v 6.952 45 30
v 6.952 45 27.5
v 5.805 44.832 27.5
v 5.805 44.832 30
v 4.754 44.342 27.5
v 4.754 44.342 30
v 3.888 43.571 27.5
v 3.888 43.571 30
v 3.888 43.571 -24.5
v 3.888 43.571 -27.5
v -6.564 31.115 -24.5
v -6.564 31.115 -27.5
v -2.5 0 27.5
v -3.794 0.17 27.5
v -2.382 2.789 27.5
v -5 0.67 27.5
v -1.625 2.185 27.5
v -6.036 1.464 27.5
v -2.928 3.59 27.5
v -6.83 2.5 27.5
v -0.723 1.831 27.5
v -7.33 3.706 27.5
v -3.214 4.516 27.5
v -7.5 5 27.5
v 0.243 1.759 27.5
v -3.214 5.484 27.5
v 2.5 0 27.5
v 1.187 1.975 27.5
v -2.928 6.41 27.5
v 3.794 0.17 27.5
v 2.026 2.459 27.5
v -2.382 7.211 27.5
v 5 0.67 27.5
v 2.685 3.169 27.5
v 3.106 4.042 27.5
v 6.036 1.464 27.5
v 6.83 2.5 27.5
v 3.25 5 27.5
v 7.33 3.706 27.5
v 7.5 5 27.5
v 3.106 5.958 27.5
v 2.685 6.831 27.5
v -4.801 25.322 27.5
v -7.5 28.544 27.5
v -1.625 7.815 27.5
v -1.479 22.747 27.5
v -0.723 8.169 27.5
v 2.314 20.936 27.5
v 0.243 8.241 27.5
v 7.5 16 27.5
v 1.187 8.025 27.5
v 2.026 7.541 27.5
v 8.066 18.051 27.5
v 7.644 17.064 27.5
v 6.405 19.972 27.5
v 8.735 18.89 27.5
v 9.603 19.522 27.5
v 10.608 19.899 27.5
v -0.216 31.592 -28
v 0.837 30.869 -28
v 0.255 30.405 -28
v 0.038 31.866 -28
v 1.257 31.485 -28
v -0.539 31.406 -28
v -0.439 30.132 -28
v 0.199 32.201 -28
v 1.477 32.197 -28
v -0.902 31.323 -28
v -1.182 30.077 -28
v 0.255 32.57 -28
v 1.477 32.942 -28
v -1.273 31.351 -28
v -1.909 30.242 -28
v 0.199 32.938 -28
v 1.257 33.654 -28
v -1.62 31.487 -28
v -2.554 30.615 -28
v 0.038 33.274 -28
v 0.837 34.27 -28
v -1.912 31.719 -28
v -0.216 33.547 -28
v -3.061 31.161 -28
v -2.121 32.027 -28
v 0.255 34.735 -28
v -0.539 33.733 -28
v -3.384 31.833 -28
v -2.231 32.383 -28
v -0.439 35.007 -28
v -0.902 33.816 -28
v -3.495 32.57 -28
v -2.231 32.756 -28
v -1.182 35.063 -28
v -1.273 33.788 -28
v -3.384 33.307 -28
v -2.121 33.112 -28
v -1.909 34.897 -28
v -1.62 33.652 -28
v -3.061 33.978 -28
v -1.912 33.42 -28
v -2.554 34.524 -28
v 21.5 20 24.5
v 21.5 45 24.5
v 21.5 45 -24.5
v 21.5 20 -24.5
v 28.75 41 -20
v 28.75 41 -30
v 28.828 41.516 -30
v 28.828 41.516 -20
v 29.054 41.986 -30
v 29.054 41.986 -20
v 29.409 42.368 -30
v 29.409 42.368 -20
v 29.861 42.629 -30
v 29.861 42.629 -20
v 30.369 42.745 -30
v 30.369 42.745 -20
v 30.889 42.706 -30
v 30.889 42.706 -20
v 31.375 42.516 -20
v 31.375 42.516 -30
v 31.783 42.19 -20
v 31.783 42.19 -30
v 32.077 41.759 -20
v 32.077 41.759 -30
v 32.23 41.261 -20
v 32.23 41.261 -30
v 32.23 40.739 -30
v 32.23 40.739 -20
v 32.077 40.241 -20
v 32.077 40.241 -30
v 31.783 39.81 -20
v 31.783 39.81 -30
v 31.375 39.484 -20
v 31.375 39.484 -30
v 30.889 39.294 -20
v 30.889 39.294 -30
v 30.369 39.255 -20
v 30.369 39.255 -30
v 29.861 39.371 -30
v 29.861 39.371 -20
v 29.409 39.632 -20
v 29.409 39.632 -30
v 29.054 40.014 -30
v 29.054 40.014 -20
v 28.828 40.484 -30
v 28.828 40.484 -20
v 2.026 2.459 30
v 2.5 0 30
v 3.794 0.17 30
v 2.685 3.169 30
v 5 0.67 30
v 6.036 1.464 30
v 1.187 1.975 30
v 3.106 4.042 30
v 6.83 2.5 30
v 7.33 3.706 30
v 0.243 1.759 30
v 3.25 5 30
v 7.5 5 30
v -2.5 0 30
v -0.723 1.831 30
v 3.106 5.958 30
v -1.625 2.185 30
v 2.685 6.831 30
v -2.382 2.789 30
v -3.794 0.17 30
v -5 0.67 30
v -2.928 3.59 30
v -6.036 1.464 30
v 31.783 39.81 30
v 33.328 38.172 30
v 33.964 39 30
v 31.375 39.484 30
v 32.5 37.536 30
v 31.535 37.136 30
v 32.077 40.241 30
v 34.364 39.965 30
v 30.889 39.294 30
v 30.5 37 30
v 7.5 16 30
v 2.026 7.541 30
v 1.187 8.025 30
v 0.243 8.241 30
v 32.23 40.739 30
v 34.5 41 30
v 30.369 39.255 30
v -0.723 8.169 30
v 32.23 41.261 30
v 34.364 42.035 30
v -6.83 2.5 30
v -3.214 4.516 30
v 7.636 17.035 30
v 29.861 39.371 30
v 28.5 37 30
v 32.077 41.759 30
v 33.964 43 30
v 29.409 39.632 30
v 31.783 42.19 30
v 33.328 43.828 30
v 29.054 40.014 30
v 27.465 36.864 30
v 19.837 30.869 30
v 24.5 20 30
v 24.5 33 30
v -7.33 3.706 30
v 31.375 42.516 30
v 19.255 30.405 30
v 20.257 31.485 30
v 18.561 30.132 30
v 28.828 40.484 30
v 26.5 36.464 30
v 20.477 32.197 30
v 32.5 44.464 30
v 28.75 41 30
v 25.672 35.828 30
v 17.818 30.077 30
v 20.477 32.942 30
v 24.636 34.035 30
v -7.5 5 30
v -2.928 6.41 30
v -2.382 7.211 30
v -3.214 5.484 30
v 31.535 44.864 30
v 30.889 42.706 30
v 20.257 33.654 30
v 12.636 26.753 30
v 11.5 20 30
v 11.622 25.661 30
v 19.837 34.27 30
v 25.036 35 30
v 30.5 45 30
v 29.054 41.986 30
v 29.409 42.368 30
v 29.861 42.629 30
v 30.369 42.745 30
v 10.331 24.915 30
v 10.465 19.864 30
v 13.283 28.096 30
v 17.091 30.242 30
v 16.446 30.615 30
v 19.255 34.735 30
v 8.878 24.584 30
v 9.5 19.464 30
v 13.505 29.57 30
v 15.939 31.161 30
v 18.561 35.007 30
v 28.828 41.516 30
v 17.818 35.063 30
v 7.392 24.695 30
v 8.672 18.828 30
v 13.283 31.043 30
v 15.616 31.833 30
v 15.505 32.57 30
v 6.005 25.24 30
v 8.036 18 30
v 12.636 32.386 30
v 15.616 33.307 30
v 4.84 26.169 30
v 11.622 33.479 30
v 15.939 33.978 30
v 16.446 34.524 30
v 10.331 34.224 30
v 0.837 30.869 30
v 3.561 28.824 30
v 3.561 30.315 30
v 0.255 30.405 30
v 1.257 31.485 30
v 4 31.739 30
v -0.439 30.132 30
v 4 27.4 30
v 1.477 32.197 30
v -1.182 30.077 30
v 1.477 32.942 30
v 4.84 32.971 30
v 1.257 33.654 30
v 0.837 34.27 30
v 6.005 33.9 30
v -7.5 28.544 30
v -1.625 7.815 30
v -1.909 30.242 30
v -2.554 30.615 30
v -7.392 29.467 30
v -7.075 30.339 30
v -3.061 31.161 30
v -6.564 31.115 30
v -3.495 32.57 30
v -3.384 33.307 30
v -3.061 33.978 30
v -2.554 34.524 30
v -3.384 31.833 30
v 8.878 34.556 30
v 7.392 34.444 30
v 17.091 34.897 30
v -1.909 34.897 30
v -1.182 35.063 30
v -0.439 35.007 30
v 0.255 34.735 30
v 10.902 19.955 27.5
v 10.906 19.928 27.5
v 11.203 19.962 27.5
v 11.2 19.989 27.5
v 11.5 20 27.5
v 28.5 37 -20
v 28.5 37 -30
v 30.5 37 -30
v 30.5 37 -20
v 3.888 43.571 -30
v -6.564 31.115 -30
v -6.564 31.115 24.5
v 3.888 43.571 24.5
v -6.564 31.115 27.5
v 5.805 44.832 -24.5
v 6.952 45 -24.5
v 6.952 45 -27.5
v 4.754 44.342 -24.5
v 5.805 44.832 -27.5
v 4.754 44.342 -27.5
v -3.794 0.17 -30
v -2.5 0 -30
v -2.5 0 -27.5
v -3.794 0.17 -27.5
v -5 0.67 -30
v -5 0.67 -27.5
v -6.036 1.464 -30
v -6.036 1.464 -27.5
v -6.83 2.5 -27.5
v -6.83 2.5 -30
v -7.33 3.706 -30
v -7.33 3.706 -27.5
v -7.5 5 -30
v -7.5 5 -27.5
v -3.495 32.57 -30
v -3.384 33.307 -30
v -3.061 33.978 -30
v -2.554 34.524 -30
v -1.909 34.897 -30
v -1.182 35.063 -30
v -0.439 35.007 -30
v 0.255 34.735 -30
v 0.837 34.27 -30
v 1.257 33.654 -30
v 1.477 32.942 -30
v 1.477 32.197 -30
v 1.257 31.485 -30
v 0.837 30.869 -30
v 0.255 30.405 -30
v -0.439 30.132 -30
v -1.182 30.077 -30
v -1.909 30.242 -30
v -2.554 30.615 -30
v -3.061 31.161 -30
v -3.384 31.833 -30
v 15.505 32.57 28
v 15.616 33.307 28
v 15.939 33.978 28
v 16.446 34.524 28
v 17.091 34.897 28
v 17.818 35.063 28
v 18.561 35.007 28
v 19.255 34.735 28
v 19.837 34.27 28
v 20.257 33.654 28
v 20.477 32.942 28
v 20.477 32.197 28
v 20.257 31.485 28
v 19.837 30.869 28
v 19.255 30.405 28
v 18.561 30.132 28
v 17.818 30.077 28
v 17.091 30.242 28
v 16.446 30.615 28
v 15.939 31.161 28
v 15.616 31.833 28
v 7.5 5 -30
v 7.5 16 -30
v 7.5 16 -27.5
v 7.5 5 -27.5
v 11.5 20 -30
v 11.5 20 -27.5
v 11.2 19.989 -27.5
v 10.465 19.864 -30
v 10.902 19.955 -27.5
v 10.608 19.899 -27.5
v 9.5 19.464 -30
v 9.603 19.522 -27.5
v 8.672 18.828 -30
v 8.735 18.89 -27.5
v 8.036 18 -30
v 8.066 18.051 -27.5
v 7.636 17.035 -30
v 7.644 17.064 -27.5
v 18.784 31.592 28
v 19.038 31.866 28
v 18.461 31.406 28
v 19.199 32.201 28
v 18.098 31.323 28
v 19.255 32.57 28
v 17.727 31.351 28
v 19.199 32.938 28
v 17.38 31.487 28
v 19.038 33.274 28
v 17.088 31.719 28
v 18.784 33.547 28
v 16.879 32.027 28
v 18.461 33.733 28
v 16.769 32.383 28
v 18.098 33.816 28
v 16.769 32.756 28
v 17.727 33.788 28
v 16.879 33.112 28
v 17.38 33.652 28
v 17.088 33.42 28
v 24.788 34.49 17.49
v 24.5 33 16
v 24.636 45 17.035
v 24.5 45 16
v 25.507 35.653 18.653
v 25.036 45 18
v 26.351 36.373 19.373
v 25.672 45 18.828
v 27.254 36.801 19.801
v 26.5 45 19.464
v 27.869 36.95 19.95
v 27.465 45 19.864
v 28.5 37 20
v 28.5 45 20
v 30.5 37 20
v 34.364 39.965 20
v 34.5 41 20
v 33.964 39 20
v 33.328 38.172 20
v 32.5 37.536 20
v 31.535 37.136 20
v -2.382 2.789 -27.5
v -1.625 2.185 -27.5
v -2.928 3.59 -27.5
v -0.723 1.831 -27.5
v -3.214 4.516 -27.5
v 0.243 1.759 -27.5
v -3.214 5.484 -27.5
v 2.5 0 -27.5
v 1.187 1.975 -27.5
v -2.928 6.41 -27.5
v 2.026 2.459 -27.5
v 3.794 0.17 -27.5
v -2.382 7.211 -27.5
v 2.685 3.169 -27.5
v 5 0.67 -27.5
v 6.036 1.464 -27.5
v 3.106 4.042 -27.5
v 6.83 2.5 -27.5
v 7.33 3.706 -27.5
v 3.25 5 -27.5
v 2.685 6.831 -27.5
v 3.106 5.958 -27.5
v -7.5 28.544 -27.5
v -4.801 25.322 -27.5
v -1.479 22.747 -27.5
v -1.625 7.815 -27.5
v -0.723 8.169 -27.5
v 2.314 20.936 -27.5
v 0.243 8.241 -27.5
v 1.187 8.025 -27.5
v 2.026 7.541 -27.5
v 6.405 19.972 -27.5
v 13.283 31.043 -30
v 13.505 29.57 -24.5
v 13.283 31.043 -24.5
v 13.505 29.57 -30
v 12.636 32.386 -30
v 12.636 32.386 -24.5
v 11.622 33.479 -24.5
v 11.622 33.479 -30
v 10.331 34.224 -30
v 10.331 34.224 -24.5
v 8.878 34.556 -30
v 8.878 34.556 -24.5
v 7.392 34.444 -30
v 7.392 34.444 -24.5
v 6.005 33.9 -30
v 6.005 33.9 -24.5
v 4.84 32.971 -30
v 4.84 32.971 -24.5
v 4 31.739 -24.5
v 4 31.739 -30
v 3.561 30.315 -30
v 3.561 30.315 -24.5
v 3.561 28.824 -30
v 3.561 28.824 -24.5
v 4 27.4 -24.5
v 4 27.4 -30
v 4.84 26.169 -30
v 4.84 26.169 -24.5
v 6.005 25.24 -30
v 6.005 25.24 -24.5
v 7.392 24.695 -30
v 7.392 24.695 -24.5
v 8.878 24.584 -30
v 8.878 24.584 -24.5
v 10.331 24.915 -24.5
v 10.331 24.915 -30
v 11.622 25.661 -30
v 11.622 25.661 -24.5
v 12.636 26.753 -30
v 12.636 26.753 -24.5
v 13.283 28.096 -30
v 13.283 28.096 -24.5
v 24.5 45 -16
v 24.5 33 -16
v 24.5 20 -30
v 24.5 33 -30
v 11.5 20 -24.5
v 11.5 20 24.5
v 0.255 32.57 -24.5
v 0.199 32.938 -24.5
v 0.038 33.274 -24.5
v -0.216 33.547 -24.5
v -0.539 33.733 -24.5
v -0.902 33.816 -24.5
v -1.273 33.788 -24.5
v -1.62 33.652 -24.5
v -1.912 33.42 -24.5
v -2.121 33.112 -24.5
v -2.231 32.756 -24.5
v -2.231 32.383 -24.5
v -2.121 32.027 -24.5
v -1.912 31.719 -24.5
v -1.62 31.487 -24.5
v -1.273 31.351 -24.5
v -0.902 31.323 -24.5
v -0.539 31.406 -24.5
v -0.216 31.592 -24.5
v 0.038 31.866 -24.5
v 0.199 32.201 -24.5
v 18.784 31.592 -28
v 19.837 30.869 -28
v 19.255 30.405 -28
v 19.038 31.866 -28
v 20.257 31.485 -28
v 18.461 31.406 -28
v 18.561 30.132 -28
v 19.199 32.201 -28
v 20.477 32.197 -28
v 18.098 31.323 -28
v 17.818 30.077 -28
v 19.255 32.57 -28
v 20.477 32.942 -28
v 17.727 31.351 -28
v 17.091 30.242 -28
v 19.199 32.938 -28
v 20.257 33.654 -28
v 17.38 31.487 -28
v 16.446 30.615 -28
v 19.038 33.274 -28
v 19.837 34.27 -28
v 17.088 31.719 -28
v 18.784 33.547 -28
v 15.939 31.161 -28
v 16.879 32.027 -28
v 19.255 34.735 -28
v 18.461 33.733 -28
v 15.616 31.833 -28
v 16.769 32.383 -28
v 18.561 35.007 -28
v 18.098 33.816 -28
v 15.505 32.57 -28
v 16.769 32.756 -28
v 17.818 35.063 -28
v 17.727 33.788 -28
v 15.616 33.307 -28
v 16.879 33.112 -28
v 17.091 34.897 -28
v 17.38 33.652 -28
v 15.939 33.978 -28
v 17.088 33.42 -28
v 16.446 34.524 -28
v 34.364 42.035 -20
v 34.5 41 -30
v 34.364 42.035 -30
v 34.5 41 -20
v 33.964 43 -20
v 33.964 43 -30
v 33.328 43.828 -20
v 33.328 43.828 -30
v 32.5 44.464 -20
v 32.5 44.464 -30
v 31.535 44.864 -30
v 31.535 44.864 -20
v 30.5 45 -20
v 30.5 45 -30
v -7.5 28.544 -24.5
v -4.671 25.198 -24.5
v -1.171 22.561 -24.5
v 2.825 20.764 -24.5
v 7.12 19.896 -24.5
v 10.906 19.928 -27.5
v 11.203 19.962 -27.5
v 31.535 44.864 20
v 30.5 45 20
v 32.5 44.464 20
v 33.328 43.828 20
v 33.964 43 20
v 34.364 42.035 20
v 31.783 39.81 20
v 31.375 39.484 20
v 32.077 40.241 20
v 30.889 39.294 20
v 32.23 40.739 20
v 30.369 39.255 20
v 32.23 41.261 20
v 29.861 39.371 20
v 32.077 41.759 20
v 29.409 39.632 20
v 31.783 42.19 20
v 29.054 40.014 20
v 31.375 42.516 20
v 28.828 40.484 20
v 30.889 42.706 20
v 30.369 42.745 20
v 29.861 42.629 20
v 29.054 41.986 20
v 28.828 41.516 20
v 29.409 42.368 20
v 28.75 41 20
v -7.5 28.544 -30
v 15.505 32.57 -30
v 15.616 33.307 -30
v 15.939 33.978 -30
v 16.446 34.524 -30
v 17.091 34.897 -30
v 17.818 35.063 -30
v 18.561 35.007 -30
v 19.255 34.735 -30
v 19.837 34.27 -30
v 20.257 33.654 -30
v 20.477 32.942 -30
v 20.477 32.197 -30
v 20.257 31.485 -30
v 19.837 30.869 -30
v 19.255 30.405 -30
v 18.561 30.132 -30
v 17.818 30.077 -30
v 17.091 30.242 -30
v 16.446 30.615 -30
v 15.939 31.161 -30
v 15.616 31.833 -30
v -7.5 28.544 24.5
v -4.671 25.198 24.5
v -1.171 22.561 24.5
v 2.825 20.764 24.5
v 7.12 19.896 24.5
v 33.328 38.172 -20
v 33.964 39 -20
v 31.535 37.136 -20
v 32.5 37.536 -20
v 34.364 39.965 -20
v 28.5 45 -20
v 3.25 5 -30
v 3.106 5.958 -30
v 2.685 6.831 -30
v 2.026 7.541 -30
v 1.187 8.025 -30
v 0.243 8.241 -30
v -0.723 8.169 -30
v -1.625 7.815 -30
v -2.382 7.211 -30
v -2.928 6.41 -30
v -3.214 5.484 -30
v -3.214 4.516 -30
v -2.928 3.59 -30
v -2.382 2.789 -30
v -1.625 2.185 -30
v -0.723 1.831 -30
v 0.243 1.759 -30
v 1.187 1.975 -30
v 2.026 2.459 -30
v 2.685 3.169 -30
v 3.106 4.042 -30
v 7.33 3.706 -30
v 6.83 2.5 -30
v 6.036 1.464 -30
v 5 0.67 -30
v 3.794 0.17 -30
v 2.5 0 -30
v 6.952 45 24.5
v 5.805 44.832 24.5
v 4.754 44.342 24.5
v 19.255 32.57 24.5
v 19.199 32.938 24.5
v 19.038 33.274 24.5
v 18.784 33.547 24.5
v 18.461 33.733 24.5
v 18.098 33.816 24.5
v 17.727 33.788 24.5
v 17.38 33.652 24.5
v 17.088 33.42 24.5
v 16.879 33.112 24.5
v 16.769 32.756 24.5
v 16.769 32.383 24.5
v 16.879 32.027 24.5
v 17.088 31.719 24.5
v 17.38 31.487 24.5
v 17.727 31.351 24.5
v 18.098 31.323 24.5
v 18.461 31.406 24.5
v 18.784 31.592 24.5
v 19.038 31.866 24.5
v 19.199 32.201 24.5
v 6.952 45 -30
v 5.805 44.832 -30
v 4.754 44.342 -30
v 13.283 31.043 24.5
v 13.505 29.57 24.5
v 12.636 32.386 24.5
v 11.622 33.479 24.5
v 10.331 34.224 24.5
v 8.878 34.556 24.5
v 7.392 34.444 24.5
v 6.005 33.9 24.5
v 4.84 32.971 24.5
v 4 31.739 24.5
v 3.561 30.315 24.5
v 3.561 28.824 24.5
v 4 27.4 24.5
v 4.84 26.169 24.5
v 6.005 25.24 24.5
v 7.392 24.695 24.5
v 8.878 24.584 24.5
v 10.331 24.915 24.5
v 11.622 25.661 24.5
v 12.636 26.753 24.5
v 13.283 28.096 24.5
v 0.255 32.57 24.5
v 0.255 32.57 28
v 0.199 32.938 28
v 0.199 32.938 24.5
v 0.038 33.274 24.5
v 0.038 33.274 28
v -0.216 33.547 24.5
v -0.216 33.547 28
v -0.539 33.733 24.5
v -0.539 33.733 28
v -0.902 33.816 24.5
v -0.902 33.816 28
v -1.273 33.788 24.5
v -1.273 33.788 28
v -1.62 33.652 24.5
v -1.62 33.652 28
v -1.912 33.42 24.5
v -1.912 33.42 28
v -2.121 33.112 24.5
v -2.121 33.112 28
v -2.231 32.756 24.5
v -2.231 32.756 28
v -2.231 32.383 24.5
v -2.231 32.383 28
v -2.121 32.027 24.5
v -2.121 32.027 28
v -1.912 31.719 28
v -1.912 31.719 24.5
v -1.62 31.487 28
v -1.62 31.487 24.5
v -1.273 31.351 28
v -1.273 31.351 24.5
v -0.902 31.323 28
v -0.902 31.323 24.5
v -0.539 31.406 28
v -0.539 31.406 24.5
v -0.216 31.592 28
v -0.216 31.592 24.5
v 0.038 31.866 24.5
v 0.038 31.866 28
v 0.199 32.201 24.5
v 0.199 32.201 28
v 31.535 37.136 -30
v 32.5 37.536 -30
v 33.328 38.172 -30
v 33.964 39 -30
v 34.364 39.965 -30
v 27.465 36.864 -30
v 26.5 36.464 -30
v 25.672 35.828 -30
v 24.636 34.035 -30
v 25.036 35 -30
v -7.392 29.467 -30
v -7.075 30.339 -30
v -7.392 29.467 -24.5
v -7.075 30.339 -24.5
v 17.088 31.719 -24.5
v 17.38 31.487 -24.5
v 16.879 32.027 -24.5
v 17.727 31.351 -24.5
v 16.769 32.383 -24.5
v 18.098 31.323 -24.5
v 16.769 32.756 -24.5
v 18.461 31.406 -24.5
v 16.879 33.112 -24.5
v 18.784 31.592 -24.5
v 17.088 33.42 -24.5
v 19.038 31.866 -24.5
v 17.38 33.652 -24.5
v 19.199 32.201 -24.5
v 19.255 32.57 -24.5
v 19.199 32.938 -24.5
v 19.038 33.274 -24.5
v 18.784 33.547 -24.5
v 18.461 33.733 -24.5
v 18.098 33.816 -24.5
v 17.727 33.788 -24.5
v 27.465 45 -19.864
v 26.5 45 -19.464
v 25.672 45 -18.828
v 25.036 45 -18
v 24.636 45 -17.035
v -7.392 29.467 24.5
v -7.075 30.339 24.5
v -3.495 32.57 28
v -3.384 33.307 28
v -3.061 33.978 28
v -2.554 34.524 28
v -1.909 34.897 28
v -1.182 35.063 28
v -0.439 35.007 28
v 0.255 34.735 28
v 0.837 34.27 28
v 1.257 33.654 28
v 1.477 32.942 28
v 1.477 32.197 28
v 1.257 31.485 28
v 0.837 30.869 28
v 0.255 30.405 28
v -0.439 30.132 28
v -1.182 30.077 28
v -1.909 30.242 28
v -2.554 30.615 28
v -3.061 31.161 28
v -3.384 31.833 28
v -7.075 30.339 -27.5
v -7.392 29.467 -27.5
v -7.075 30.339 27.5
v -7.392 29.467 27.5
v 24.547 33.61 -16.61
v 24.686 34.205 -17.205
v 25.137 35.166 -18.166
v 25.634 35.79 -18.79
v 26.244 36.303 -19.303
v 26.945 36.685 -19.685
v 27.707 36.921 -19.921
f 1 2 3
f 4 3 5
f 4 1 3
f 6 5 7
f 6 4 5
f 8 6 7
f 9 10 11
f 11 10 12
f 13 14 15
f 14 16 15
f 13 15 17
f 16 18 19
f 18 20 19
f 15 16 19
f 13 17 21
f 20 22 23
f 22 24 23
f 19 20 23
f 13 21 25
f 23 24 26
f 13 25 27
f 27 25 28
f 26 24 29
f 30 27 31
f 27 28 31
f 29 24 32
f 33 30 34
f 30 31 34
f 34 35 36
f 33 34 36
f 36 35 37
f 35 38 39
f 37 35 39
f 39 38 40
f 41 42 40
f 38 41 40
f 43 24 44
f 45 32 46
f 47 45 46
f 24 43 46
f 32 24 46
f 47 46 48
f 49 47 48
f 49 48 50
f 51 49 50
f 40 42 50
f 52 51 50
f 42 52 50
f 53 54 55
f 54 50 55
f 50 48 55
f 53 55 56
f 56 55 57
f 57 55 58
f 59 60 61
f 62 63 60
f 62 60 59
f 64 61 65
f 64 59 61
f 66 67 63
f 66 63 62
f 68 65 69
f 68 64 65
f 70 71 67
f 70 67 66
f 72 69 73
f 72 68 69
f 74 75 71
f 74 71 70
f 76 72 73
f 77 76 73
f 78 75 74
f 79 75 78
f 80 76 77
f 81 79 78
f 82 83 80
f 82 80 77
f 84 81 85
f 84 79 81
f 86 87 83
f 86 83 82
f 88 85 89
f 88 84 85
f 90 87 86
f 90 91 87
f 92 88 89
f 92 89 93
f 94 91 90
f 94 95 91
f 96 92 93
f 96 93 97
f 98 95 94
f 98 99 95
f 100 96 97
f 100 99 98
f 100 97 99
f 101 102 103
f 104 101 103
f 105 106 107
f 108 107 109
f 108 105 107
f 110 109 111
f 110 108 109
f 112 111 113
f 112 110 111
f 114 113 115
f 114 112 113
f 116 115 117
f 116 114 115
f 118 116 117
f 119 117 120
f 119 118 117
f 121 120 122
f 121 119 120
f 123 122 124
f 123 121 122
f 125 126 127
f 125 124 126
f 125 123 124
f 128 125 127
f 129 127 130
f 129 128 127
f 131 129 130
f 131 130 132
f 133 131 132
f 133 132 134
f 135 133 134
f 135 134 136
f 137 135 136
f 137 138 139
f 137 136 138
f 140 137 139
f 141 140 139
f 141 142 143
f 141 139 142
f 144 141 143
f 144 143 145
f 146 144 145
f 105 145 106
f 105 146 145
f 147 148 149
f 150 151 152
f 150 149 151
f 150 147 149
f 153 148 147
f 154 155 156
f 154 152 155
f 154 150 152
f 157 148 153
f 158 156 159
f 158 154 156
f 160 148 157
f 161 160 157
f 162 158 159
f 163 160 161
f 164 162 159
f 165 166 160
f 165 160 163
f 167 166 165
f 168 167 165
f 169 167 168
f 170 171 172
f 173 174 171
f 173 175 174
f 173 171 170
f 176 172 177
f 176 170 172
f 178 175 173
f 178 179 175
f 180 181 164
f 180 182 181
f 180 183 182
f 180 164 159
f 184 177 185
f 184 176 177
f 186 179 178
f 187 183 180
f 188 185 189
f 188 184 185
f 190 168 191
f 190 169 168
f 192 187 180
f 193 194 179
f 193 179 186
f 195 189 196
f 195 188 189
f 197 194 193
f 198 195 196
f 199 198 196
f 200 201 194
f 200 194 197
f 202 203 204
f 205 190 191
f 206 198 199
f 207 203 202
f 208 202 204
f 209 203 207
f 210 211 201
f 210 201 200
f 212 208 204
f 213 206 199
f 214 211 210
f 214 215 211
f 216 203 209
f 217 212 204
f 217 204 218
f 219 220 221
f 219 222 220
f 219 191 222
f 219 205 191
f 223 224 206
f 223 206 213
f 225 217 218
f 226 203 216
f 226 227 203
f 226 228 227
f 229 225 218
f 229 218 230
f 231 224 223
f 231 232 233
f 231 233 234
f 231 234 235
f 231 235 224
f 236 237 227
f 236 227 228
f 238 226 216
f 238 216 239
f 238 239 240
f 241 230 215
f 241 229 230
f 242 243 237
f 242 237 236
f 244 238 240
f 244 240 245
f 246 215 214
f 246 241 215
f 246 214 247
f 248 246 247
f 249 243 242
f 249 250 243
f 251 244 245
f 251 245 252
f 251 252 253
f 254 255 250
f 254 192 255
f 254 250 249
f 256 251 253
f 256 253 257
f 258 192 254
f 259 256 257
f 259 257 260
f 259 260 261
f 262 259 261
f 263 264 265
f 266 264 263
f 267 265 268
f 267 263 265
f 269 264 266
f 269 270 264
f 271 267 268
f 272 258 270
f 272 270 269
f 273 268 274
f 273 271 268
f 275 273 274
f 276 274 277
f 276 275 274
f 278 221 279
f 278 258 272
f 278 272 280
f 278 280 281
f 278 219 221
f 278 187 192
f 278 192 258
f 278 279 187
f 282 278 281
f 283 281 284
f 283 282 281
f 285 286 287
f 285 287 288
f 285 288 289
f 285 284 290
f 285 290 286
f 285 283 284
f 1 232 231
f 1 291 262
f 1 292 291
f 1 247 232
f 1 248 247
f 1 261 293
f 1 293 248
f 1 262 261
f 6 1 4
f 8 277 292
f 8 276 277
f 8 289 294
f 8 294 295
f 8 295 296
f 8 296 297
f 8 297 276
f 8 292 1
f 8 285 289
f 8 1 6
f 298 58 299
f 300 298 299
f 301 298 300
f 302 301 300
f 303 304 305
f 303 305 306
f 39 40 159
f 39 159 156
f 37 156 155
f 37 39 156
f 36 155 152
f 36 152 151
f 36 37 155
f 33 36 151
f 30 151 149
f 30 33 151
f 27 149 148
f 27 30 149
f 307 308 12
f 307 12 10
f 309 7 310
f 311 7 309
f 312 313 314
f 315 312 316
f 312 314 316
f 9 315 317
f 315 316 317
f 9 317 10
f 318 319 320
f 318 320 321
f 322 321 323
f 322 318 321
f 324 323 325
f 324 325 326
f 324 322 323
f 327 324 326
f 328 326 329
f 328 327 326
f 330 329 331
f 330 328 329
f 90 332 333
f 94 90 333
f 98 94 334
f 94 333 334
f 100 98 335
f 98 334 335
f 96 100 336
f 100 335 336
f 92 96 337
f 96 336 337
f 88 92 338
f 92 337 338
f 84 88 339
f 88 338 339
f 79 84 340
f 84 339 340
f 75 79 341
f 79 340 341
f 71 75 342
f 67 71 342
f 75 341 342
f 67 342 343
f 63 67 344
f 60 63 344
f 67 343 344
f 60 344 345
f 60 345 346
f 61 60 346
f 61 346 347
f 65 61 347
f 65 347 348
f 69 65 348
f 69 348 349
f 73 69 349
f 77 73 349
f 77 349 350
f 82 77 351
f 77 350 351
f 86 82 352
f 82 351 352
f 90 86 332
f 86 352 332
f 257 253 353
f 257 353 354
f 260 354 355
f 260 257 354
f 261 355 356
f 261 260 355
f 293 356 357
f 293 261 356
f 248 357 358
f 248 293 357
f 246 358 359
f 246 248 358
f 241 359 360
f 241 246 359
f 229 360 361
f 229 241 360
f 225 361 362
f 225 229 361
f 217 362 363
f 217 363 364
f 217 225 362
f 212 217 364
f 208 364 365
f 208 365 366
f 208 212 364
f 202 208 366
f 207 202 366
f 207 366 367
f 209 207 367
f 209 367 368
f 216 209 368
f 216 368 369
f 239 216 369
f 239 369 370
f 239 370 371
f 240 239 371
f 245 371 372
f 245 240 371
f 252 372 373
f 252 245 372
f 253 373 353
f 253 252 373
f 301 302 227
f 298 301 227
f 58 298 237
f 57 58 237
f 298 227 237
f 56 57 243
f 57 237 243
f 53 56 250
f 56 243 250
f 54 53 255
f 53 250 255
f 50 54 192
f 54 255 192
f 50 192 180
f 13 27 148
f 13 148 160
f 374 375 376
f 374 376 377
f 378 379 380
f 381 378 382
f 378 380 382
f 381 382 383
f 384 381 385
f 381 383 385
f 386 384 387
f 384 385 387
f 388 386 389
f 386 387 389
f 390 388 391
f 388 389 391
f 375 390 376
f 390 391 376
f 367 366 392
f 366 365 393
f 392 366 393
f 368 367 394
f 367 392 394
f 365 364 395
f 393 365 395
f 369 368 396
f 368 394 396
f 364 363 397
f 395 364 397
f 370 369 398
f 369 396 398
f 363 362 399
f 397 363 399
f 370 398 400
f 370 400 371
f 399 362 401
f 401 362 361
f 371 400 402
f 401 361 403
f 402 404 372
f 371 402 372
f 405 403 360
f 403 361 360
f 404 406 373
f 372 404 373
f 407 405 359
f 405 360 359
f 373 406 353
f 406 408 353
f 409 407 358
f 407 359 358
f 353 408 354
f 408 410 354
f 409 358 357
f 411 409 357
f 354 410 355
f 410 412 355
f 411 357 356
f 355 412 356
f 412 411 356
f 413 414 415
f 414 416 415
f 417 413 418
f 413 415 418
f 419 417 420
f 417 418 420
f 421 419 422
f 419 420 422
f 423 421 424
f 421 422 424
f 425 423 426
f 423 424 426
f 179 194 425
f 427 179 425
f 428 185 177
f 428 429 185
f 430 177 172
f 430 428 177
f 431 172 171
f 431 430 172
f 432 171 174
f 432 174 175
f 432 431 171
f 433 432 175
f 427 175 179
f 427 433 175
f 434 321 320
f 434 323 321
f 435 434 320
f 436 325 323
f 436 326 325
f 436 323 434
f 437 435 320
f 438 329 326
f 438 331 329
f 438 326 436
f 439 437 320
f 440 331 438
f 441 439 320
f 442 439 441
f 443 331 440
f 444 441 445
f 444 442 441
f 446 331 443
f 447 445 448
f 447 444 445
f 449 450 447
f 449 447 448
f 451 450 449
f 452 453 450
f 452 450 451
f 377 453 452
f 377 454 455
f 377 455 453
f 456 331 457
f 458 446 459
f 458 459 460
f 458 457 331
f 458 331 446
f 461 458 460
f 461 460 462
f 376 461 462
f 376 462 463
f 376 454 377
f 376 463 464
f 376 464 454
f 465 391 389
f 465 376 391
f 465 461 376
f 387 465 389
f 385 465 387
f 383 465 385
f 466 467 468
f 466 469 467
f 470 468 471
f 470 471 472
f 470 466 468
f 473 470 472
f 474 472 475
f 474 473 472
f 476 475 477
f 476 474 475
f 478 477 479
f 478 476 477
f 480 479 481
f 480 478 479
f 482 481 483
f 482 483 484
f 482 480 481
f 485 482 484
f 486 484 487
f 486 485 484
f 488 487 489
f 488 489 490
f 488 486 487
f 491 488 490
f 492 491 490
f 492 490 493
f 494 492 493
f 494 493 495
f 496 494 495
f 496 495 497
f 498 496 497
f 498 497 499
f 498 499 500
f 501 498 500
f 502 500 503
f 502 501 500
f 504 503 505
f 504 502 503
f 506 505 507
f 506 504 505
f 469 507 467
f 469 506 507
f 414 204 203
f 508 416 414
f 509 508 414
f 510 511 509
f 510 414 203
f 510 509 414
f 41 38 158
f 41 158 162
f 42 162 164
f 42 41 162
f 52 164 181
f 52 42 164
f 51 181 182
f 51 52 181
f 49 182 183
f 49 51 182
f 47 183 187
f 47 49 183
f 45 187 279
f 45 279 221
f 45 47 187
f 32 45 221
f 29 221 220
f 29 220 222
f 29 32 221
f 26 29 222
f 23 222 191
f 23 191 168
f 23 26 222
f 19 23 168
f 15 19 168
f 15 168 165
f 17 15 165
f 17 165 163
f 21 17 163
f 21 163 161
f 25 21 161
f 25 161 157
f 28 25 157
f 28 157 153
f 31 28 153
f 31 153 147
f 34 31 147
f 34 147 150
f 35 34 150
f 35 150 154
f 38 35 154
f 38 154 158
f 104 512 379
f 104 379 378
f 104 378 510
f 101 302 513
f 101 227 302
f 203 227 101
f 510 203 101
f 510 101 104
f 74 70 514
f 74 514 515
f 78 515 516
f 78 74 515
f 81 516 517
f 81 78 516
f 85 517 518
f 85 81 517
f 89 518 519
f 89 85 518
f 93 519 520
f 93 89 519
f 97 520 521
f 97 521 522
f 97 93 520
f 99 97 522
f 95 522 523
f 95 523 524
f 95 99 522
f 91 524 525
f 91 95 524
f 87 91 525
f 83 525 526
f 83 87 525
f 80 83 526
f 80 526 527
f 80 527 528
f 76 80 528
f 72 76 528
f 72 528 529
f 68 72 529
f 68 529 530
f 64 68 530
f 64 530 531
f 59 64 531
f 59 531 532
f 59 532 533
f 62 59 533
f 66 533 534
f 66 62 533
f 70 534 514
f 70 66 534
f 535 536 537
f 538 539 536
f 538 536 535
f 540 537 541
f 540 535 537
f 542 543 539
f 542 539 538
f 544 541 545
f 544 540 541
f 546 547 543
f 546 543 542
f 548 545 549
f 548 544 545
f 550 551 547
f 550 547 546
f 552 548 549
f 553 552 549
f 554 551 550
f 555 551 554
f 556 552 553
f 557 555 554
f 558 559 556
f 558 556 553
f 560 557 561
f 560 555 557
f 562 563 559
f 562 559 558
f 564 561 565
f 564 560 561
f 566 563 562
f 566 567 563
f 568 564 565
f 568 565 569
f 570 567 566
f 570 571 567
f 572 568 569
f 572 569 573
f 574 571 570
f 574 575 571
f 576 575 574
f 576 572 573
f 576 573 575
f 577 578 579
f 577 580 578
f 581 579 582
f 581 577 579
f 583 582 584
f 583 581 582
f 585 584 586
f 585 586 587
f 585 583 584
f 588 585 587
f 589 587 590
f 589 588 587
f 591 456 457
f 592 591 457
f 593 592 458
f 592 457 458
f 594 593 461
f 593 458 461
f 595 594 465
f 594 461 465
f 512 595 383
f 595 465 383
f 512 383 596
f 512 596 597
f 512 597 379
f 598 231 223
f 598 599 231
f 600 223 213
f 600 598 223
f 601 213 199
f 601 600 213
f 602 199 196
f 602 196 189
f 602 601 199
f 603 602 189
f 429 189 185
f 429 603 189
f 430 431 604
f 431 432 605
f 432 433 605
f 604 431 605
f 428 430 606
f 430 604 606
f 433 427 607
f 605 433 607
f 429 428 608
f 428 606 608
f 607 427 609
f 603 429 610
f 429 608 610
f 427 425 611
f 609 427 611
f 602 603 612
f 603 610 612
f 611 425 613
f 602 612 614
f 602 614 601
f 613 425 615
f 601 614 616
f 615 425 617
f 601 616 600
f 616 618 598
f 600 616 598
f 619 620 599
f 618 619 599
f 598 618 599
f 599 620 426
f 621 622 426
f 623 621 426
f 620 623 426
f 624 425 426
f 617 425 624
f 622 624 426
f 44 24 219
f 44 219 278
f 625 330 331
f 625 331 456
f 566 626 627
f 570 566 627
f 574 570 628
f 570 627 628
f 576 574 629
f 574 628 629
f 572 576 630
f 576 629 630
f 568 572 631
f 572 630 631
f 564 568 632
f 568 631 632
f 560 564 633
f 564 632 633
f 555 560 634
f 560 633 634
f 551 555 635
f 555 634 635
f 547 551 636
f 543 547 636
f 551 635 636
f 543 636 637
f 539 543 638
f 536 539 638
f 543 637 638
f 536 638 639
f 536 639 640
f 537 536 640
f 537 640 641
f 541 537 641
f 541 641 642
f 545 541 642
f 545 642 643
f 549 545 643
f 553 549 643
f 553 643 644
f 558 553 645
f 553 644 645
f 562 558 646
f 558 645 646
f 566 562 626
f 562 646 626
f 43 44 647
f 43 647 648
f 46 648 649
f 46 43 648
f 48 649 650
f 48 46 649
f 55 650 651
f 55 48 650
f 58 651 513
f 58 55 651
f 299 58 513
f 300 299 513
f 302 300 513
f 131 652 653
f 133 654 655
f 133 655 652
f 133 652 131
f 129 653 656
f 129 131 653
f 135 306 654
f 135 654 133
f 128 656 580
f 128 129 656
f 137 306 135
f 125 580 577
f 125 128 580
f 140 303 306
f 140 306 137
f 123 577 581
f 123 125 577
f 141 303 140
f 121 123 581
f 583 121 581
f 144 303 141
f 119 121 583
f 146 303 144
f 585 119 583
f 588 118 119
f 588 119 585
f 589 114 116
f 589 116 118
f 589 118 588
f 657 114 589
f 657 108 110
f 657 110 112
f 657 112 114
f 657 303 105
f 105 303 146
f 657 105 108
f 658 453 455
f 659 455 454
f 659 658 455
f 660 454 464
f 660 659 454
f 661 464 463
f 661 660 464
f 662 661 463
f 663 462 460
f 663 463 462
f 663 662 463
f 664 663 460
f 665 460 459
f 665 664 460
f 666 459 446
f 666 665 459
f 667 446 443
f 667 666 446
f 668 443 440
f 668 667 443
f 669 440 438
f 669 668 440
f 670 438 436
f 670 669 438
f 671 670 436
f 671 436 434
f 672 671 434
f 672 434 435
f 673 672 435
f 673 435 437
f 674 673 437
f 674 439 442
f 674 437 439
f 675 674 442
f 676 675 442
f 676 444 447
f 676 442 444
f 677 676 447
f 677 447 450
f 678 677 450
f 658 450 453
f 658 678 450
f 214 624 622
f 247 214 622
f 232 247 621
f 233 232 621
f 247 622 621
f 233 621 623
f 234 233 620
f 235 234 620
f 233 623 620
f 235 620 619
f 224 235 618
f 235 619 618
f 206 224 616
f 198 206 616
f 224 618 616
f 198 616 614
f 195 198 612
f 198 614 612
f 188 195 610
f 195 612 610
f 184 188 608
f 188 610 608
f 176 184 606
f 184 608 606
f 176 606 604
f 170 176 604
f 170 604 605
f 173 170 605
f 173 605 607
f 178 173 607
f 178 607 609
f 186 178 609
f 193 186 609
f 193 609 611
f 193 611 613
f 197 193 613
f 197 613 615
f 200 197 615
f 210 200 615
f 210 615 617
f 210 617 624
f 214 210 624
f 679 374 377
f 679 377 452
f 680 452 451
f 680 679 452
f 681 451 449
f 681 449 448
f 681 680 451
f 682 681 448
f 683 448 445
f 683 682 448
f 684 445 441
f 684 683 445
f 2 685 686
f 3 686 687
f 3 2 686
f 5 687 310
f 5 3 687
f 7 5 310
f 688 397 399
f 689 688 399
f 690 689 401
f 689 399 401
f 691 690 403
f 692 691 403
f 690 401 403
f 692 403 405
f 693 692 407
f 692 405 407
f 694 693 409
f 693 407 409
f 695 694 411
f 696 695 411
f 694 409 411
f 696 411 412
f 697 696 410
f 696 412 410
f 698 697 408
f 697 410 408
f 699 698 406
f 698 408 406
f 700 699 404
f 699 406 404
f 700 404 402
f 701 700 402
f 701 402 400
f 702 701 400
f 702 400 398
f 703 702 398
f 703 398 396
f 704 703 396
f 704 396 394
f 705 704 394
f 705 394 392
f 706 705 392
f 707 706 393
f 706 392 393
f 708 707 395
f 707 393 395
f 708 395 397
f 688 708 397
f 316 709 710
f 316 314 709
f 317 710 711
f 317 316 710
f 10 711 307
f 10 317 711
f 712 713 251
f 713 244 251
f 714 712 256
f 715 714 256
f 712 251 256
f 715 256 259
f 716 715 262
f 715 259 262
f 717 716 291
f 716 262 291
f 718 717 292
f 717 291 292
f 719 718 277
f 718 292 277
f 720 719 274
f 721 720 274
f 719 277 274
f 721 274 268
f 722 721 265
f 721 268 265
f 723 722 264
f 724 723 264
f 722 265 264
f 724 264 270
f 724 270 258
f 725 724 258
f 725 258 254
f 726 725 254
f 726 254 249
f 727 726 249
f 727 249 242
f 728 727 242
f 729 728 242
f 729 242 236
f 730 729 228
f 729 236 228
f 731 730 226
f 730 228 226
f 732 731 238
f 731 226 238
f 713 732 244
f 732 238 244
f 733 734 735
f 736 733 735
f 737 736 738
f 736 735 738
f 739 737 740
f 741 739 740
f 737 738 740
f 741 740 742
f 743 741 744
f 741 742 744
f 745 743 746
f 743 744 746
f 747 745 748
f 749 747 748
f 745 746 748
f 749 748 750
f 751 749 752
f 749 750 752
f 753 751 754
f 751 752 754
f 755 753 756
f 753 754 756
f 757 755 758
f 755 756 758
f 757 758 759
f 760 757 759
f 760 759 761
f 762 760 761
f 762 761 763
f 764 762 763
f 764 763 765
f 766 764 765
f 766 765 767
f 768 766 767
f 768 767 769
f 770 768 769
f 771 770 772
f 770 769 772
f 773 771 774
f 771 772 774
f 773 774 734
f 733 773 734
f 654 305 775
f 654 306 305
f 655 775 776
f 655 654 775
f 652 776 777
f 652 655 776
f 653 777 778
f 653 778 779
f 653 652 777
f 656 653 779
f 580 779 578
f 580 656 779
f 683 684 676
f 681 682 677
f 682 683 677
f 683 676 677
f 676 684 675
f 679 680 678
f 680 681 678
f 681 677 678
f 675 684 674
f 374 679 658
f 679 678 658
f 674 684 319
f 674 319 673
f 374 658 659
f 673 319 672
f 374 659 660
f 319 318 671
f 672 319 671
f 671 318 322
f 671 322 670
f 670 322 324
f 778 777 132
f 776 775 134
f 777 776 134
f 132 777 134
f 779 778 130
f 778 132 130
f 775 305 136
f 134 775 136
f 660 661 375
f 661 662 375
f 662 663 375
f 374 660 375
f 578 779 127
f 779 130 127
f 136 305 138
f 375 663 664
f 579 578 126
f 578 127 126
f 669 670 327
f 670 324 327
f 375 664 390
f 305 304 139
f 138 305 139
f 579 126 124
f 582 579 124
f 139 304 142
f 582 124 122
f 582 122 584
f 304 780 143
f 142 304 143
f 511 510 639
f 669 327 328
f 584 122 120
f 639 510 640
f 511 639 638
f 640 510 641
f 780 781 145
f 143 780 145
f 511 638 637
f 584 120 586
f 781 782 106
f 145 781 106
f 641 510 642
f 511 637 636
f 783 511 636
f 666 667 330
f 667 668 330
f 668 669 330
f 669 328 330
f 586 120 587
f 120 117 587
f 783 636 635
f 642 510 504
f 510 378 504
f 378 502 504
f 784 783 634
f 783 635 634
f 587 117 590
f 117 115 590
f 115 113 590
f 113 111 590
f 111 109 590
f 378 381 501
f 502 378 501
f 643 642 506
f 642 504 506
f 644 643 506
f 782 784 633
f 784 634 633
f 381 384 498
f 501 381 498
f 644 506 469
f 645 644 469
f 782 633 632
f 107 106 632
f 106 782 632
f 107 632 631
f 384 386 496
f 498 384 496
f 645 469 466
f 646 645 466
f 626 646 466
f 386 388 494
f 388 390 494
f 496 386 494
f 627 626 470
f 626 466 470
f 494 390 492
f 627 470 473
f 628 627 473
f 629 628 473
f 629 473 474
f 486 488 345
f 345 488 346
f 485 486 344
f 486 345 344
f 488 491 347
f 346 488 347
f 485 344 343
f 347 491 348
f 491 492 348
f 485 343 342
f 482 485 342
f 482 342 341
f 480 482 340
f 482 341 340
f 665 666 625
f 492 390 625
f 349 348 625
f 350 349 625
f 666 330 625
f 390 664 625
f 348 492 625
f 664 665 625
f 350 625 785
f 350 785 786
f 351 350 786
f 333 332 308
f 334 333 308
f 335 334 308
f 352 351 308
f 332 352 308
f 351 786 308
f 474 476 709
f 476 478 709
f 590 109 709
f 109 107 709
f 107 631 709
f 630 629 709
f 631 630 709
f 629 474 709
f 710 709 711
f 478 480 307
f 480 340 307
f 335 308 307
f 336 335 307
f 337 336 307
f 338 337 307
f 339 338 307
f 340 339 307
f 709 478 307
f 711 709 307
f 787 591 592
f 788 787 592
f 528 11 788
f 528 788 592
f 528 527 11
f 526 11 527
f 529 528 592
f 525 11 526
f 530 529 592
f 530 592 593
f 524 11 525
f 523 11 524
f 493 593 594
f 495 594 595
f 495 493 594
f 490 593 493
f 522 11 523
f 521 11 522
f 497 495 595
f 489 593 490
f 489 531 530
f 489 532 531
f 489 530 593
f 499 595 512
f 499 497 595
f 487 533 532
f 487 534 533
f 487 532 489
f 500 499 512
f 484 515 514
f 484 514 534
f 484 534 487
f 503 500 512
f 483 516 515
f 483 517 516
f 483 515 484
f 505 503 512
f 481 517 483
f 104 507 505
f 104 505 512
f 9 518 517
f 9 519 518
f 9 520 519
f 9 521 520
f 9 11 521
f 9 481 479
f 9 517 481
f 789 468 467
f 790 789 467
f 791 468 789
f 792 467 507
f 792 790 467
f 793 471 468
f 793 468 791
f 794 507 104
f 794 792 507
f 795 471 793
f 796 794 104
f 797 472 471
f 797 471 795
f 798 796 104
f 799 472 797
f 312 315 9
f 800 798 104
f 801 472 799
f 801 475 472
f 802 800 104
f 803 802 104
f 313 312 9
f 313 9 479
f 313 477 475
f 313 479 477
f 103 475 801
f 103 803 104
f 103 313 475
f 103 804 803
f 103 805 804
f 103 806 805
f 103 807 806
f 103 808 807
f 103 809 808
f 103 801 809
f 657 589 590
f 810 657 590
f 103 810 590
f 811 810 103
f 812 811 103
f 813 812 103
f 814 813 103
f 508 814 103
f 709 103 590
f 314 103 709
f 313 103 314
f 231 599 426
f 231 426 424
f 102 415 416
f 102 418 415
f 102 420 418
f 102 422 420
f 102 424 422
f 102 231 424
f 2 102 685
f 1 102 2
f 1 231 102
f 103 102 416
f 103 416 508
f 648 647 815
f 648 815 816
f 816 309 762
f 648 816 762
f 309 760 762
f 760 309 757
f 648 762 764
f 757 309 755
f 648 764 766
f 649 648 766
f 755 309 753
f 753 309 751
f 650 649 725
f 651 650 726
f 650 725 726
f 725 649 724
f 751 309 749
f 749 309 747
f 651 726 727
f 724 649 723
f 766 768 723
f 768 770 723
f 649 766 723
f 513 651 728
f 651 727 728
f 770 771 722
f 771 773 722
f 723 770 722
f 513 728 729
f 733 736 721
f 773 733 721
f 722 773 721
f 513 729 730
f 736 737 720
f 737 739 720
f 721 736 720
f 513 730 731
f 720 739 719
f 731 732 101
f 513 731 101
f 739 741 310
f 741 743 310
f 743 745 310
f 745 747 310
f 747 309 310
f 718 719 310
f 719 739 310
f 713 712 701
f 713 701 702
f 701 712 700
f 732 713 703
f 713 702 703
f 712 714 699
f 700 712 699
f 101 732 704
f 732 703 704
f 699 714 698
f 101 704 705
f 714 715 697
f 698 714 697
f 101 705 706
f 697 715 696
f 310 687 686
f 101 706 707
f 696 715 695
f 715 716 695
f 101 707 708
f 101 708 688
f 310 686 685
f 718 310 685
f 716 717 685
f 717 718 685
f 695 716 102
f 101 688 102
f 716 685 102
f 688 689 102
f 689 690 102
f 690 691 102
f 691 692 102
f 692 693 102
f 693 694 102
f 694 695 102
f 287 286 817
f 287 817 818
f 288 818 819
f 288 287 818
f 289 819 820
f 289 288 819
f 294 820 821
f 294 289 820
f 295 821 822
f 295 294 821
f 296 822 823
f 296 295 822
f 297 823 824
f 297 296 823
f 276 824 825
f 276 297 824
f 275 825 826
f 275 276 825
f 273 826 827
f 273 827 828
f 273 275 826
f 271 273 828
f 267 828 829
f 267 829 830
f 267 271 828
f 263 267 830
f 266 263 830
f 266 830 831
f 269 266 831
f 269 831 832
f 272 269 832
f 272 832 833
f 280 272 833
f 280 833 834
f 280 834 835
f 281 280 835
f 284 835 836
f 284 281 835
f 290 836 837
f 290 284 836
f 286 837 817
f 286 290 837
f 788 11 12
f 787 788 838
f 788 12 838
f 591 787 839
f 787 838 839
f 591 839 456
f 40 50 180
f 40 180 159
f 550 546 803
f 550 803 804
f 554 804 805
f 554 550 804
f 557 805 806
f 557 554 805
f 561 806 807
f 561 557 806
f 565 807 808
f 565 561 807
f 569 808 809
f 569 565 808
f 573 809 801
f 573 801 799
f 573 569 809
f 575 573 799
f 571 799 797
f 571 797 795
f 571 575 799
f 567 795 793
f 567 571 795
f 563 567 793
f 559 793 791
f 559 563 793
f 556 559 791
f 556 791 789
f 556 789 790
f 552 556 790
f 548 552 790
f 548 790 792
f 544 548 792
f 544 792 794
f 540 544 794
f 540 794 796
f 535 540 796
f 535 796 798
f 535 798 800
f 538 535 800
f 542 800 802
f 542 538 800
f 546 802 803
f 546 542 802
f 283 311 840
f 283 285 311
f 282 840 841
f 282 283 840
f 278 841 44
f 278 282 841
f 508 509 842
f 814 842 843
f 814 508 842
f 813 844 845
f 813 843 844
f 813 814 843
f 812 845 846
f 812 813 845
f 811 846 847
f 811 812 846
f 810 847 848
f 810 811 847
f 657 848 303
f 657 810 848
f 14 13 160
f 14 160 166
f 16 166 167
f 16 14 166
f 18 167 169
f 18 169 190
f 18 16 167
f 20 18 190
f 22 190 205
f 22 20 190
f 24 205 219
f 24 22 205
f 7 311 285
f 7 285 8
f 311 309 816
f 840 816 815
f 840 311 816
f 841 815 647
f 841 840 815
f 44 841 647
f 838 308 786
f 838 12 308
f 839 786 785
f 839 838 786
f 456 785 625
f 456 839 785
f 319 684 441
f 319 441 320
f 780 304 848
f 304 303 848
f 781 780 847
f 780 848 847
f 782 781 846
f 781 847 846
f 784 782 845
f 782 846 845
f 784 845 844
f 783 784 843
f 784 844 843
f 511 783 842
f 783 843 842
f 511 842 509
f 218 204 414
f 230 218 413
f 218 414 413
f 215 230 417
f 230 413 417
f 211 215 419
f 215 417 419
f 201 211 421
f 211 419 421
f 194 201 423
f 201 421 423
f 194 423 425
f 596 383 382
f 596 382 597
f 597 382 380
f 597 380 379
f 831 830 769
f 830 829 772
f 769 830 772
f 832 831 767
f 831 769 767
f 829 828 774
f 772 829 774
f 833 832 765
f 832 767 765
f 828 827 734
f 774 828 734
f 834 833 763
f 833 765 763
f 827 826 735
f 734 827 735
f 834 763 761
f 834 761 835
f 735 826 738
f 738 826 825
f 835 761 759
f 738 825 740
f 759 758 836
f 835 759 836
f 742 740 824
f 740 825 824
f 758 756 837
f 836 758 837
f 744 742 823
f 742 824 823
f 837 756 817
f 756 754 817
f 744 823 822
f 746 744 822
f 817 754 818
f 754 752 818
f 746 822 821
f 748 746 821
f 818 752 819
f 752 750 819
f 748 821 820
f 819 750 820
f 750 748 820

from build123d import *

# Parameters (mm, degrees)
BOSS_EXTRUDE1_DEPTH      = 30
BOSS_EXTRUDE1_DEPTH_BACK = 30
SKETCH2_R                = 3.25
SKETCH2_R_2              = 1.25
SKETCH2_R_3              = 5
SKETCH3_W                = 58
SKETCH3_H                = 55
CUT_EXTRUDE1_DEPTH       = 60.373815778
SKETCH4_W                = 10
SKETCH4_H                = 8
BOSS_EXTRUDE2_DEPTH      = 10
FILLET1_R                = 4
SKETCH5_R                = 1.75
CUT_EXTRUDE2_DEPTH       = 76.599272483
FILLET1_OF_MIRROR1_R     = 4
FILLET2_R                = 4
SKETCH6_R                = 1.25
SKETCH6_R_2              = 5
BOSS_EXTRUDE3_DEPTH      = 3
SKETCH7_R                = 2.5
CUT_EXTRUDE3_DEPTH       = 2


with BuildPart() as part:
    # Sketch2 → Boss-Extrude1 (new, two sides: drawn at the far end of the back side and taken through both)
    with BuildSketch(Plane.XY.offset(-BOSS_EXTRUDE1_DEPTH_BACK)):
        with BuildLine():
            Line((-7.5, 5), (-7.5, 30))
            Line((-7.5, 30), (5.086494468, 45))
            Line((5.086494468, 45), (24.5, 45))
            Line((24.5, 45), (24.5, 20))
            Line((24.5, 20), (7.5, 20))
            Line((7.5, 20), (7.5, 5))
            ThreePointArc((7.5, 5), (6.035533906, 1.464466094), (2.5, 0))
            Line((2.5, 0), (-2.5, 0))
            ThreePointArc((-2.5, 0), (-6.035533906, 1.464466094), (-7.5, 5))
        make_face()
        with Locations((0, 5)):
            Circle(SKETCH2_R, mode=Mode.SUBTRACT)
        with Locations((18.004770913, 32.569673822)):
            Circle(SKETCH2_R_2, mode=Mode.SUBTRACT)
        with Locations((-0.995229087, 32.569673822)):
            Circle(SKETCH2_R_2, mode=Mode.SUBTRACT)
        with Locations((8.504770913, 29.569673822)):
            Circle(SKETCH2_R_3, mode=Mode.SUBTRACT)
    extrude(amount=BOSS_EXTRUDE1_DEPTH + BOSS_EXTRUDE1_DEPTH_BACK)

    # Sketch3 → Cut-Extrude1 (cut, through all)
    with BuildSketch(Plane(origin=(0, 45, 0), x_dir=(1, 0, 0), z_dir=(0, 1, 0))):
        with Locations((-7.5, 0)):
            Rectangle(SKETCH3_W, SKETCH3_H)
    extrude(amount=-CUT_EXTRUDE1_DEPTH, mode=Mode.SUBTRACT)

    # Sketch4 → Boss-Extrude2 (add)
    with BuildSketch(Plane(origin=(24.5, 0, 0), x_dir=(0, 0, -1), z_dir=(1, 0, 0))):
        with Locations((-25, 41)):
            Rectangle(SKETCH4_W, SKETCH4_H)
    boss_extrude2 = extrude(amount=BOSS_EXTRUDE2_DEPTH)

    # Fillet1
    fillet1_edges = [part.edges().sort_by_distance(p)[0] for p in [
        (34.5, 37, 25),
        (34.5, 45, 25),
    ]]
    fillet(fillet1_edges, radius=FILLET1_R - 0.0001)  # a hair under: the kernel refuses the full size

    # Sketch5 → Cut-Extrude2 (cut, through all)
    with BuildSketch(Plane(origin=(0, 0, 20), x_dir=(-1, 0, 0), z_dir=(0, 0, -1))):
        with Locations((-30.5, 41)):
            Circle(SKETCH5_R)
    cut_extrude2 = extrude(amount=-CUT_EXTRUDE2_DEPTH, mode=Mode.SUBTRACT)

    # Mirror1: Boss-Extrude2, Cut-Extrude2 across plane
    add(boss_extrude2.mirror(Plane.XY))
    add(cut_extrude2.mirror(Plane.XY), mode=Mode.SUBTRACT)

    # Fillet1 of Mirror1
    fillet1_of_mirror1_edges = [part.edges().sort_by_distance(p)[0] for p in [
        (34.5, 37, -25),
        (34.5, 45, -25),
    ]]
    fillet(fillet1_of_mirror1_edges, radius=FILLET1_OF_MIRROR1_R - 0.0001)  # a hair under: the kernel refuses the full size

    # Fillet2
    fillet2_edges = [part.edges().sort_by_distance(p)[0] for p in [
        (24.5, 37, 25),
        (24.5, 41, 20),
        (24.5, 37, -25),
        (24.5, 41, -20),
        (5.086494468, 45, -28.75),
        (7.5, 20, -28.75),
        (-7.5, 30, -28.75),
        (-7.5, 30, 28.75),
        (7.5, 20, 28.75),
        (5.086494468, 45, 28.75),
    ]]
    fillet(fillet2_edges, radius=FILLET2_R)

    # Sketch6 → Boss-Extrude3 (add)
    with BuildSketch(Plane.XY.offset(-27.5)):
        with BuildLine():
            Line((21.5, 45), (6.9517251, 45))
            ThreePointArc((6.9517251, 45), (5.261252053, 44.625231148), (3.887547328, 43.571150439))
            Line((3.887547328, 43.571150439), (-6.564177772, 31.115269502))
            ThreePointArc((-6.564177772, 31.115269502), (-7.258770483, 29.912199636), (-7.5, 28.544119063))
            ThreePointArc((-7.5, 28.544119063), (0.776489044, 21.551274863), (11.5, 20))
            Line((11.5, 20), (21.5, 20))
            Line((21.5, 20), (21.5, 45))
        make_face()
        with Locations((18.004770913, 32.569673822)):
            Circle(SKETCH6_R, mode=Mode.SUBTRACT)
        with Locations((8.504770913, 29.569673822)):
            Circle(SKETCH6_R_2, mode=Mode.SUBTRACT)
        with Locations((-0.995229087, 32.569673822)):
            Circle(SKETCH6_R, mode=Mode.SUBTRACT)
    boss_extrude3 = extrude(amount=BOSS_EXTRUDE3_DEPTH)

    # Sketch7 → Cut-Extrude3 (cut)
    with BuildSketch(Plane(origin=(0, 0, -30), x_dir=(-1, 0, 0), z_dir=(0, 0, -1))):
        with Locations((-18.004770913, 32.569673822)):
            Circle(SKETCH7_R)
        with Locations((0.995229087, 32.569673822)):
            Circle(SKETCH7_R)
    cut_extrude3 = extrude(amount=-CUT_EXTRUDE3_DEPTH, mode=Mode.SUBTRACT)

    # Mirror2: Boss-Extrude3, Cut-Extrude3 across plane
    add(boss_extrude3.mirror(Plane.XY))
    add(cut_extrude3.mirror(Plane.XY), mode=Mode.SUBTRACT)


solid = part.part
